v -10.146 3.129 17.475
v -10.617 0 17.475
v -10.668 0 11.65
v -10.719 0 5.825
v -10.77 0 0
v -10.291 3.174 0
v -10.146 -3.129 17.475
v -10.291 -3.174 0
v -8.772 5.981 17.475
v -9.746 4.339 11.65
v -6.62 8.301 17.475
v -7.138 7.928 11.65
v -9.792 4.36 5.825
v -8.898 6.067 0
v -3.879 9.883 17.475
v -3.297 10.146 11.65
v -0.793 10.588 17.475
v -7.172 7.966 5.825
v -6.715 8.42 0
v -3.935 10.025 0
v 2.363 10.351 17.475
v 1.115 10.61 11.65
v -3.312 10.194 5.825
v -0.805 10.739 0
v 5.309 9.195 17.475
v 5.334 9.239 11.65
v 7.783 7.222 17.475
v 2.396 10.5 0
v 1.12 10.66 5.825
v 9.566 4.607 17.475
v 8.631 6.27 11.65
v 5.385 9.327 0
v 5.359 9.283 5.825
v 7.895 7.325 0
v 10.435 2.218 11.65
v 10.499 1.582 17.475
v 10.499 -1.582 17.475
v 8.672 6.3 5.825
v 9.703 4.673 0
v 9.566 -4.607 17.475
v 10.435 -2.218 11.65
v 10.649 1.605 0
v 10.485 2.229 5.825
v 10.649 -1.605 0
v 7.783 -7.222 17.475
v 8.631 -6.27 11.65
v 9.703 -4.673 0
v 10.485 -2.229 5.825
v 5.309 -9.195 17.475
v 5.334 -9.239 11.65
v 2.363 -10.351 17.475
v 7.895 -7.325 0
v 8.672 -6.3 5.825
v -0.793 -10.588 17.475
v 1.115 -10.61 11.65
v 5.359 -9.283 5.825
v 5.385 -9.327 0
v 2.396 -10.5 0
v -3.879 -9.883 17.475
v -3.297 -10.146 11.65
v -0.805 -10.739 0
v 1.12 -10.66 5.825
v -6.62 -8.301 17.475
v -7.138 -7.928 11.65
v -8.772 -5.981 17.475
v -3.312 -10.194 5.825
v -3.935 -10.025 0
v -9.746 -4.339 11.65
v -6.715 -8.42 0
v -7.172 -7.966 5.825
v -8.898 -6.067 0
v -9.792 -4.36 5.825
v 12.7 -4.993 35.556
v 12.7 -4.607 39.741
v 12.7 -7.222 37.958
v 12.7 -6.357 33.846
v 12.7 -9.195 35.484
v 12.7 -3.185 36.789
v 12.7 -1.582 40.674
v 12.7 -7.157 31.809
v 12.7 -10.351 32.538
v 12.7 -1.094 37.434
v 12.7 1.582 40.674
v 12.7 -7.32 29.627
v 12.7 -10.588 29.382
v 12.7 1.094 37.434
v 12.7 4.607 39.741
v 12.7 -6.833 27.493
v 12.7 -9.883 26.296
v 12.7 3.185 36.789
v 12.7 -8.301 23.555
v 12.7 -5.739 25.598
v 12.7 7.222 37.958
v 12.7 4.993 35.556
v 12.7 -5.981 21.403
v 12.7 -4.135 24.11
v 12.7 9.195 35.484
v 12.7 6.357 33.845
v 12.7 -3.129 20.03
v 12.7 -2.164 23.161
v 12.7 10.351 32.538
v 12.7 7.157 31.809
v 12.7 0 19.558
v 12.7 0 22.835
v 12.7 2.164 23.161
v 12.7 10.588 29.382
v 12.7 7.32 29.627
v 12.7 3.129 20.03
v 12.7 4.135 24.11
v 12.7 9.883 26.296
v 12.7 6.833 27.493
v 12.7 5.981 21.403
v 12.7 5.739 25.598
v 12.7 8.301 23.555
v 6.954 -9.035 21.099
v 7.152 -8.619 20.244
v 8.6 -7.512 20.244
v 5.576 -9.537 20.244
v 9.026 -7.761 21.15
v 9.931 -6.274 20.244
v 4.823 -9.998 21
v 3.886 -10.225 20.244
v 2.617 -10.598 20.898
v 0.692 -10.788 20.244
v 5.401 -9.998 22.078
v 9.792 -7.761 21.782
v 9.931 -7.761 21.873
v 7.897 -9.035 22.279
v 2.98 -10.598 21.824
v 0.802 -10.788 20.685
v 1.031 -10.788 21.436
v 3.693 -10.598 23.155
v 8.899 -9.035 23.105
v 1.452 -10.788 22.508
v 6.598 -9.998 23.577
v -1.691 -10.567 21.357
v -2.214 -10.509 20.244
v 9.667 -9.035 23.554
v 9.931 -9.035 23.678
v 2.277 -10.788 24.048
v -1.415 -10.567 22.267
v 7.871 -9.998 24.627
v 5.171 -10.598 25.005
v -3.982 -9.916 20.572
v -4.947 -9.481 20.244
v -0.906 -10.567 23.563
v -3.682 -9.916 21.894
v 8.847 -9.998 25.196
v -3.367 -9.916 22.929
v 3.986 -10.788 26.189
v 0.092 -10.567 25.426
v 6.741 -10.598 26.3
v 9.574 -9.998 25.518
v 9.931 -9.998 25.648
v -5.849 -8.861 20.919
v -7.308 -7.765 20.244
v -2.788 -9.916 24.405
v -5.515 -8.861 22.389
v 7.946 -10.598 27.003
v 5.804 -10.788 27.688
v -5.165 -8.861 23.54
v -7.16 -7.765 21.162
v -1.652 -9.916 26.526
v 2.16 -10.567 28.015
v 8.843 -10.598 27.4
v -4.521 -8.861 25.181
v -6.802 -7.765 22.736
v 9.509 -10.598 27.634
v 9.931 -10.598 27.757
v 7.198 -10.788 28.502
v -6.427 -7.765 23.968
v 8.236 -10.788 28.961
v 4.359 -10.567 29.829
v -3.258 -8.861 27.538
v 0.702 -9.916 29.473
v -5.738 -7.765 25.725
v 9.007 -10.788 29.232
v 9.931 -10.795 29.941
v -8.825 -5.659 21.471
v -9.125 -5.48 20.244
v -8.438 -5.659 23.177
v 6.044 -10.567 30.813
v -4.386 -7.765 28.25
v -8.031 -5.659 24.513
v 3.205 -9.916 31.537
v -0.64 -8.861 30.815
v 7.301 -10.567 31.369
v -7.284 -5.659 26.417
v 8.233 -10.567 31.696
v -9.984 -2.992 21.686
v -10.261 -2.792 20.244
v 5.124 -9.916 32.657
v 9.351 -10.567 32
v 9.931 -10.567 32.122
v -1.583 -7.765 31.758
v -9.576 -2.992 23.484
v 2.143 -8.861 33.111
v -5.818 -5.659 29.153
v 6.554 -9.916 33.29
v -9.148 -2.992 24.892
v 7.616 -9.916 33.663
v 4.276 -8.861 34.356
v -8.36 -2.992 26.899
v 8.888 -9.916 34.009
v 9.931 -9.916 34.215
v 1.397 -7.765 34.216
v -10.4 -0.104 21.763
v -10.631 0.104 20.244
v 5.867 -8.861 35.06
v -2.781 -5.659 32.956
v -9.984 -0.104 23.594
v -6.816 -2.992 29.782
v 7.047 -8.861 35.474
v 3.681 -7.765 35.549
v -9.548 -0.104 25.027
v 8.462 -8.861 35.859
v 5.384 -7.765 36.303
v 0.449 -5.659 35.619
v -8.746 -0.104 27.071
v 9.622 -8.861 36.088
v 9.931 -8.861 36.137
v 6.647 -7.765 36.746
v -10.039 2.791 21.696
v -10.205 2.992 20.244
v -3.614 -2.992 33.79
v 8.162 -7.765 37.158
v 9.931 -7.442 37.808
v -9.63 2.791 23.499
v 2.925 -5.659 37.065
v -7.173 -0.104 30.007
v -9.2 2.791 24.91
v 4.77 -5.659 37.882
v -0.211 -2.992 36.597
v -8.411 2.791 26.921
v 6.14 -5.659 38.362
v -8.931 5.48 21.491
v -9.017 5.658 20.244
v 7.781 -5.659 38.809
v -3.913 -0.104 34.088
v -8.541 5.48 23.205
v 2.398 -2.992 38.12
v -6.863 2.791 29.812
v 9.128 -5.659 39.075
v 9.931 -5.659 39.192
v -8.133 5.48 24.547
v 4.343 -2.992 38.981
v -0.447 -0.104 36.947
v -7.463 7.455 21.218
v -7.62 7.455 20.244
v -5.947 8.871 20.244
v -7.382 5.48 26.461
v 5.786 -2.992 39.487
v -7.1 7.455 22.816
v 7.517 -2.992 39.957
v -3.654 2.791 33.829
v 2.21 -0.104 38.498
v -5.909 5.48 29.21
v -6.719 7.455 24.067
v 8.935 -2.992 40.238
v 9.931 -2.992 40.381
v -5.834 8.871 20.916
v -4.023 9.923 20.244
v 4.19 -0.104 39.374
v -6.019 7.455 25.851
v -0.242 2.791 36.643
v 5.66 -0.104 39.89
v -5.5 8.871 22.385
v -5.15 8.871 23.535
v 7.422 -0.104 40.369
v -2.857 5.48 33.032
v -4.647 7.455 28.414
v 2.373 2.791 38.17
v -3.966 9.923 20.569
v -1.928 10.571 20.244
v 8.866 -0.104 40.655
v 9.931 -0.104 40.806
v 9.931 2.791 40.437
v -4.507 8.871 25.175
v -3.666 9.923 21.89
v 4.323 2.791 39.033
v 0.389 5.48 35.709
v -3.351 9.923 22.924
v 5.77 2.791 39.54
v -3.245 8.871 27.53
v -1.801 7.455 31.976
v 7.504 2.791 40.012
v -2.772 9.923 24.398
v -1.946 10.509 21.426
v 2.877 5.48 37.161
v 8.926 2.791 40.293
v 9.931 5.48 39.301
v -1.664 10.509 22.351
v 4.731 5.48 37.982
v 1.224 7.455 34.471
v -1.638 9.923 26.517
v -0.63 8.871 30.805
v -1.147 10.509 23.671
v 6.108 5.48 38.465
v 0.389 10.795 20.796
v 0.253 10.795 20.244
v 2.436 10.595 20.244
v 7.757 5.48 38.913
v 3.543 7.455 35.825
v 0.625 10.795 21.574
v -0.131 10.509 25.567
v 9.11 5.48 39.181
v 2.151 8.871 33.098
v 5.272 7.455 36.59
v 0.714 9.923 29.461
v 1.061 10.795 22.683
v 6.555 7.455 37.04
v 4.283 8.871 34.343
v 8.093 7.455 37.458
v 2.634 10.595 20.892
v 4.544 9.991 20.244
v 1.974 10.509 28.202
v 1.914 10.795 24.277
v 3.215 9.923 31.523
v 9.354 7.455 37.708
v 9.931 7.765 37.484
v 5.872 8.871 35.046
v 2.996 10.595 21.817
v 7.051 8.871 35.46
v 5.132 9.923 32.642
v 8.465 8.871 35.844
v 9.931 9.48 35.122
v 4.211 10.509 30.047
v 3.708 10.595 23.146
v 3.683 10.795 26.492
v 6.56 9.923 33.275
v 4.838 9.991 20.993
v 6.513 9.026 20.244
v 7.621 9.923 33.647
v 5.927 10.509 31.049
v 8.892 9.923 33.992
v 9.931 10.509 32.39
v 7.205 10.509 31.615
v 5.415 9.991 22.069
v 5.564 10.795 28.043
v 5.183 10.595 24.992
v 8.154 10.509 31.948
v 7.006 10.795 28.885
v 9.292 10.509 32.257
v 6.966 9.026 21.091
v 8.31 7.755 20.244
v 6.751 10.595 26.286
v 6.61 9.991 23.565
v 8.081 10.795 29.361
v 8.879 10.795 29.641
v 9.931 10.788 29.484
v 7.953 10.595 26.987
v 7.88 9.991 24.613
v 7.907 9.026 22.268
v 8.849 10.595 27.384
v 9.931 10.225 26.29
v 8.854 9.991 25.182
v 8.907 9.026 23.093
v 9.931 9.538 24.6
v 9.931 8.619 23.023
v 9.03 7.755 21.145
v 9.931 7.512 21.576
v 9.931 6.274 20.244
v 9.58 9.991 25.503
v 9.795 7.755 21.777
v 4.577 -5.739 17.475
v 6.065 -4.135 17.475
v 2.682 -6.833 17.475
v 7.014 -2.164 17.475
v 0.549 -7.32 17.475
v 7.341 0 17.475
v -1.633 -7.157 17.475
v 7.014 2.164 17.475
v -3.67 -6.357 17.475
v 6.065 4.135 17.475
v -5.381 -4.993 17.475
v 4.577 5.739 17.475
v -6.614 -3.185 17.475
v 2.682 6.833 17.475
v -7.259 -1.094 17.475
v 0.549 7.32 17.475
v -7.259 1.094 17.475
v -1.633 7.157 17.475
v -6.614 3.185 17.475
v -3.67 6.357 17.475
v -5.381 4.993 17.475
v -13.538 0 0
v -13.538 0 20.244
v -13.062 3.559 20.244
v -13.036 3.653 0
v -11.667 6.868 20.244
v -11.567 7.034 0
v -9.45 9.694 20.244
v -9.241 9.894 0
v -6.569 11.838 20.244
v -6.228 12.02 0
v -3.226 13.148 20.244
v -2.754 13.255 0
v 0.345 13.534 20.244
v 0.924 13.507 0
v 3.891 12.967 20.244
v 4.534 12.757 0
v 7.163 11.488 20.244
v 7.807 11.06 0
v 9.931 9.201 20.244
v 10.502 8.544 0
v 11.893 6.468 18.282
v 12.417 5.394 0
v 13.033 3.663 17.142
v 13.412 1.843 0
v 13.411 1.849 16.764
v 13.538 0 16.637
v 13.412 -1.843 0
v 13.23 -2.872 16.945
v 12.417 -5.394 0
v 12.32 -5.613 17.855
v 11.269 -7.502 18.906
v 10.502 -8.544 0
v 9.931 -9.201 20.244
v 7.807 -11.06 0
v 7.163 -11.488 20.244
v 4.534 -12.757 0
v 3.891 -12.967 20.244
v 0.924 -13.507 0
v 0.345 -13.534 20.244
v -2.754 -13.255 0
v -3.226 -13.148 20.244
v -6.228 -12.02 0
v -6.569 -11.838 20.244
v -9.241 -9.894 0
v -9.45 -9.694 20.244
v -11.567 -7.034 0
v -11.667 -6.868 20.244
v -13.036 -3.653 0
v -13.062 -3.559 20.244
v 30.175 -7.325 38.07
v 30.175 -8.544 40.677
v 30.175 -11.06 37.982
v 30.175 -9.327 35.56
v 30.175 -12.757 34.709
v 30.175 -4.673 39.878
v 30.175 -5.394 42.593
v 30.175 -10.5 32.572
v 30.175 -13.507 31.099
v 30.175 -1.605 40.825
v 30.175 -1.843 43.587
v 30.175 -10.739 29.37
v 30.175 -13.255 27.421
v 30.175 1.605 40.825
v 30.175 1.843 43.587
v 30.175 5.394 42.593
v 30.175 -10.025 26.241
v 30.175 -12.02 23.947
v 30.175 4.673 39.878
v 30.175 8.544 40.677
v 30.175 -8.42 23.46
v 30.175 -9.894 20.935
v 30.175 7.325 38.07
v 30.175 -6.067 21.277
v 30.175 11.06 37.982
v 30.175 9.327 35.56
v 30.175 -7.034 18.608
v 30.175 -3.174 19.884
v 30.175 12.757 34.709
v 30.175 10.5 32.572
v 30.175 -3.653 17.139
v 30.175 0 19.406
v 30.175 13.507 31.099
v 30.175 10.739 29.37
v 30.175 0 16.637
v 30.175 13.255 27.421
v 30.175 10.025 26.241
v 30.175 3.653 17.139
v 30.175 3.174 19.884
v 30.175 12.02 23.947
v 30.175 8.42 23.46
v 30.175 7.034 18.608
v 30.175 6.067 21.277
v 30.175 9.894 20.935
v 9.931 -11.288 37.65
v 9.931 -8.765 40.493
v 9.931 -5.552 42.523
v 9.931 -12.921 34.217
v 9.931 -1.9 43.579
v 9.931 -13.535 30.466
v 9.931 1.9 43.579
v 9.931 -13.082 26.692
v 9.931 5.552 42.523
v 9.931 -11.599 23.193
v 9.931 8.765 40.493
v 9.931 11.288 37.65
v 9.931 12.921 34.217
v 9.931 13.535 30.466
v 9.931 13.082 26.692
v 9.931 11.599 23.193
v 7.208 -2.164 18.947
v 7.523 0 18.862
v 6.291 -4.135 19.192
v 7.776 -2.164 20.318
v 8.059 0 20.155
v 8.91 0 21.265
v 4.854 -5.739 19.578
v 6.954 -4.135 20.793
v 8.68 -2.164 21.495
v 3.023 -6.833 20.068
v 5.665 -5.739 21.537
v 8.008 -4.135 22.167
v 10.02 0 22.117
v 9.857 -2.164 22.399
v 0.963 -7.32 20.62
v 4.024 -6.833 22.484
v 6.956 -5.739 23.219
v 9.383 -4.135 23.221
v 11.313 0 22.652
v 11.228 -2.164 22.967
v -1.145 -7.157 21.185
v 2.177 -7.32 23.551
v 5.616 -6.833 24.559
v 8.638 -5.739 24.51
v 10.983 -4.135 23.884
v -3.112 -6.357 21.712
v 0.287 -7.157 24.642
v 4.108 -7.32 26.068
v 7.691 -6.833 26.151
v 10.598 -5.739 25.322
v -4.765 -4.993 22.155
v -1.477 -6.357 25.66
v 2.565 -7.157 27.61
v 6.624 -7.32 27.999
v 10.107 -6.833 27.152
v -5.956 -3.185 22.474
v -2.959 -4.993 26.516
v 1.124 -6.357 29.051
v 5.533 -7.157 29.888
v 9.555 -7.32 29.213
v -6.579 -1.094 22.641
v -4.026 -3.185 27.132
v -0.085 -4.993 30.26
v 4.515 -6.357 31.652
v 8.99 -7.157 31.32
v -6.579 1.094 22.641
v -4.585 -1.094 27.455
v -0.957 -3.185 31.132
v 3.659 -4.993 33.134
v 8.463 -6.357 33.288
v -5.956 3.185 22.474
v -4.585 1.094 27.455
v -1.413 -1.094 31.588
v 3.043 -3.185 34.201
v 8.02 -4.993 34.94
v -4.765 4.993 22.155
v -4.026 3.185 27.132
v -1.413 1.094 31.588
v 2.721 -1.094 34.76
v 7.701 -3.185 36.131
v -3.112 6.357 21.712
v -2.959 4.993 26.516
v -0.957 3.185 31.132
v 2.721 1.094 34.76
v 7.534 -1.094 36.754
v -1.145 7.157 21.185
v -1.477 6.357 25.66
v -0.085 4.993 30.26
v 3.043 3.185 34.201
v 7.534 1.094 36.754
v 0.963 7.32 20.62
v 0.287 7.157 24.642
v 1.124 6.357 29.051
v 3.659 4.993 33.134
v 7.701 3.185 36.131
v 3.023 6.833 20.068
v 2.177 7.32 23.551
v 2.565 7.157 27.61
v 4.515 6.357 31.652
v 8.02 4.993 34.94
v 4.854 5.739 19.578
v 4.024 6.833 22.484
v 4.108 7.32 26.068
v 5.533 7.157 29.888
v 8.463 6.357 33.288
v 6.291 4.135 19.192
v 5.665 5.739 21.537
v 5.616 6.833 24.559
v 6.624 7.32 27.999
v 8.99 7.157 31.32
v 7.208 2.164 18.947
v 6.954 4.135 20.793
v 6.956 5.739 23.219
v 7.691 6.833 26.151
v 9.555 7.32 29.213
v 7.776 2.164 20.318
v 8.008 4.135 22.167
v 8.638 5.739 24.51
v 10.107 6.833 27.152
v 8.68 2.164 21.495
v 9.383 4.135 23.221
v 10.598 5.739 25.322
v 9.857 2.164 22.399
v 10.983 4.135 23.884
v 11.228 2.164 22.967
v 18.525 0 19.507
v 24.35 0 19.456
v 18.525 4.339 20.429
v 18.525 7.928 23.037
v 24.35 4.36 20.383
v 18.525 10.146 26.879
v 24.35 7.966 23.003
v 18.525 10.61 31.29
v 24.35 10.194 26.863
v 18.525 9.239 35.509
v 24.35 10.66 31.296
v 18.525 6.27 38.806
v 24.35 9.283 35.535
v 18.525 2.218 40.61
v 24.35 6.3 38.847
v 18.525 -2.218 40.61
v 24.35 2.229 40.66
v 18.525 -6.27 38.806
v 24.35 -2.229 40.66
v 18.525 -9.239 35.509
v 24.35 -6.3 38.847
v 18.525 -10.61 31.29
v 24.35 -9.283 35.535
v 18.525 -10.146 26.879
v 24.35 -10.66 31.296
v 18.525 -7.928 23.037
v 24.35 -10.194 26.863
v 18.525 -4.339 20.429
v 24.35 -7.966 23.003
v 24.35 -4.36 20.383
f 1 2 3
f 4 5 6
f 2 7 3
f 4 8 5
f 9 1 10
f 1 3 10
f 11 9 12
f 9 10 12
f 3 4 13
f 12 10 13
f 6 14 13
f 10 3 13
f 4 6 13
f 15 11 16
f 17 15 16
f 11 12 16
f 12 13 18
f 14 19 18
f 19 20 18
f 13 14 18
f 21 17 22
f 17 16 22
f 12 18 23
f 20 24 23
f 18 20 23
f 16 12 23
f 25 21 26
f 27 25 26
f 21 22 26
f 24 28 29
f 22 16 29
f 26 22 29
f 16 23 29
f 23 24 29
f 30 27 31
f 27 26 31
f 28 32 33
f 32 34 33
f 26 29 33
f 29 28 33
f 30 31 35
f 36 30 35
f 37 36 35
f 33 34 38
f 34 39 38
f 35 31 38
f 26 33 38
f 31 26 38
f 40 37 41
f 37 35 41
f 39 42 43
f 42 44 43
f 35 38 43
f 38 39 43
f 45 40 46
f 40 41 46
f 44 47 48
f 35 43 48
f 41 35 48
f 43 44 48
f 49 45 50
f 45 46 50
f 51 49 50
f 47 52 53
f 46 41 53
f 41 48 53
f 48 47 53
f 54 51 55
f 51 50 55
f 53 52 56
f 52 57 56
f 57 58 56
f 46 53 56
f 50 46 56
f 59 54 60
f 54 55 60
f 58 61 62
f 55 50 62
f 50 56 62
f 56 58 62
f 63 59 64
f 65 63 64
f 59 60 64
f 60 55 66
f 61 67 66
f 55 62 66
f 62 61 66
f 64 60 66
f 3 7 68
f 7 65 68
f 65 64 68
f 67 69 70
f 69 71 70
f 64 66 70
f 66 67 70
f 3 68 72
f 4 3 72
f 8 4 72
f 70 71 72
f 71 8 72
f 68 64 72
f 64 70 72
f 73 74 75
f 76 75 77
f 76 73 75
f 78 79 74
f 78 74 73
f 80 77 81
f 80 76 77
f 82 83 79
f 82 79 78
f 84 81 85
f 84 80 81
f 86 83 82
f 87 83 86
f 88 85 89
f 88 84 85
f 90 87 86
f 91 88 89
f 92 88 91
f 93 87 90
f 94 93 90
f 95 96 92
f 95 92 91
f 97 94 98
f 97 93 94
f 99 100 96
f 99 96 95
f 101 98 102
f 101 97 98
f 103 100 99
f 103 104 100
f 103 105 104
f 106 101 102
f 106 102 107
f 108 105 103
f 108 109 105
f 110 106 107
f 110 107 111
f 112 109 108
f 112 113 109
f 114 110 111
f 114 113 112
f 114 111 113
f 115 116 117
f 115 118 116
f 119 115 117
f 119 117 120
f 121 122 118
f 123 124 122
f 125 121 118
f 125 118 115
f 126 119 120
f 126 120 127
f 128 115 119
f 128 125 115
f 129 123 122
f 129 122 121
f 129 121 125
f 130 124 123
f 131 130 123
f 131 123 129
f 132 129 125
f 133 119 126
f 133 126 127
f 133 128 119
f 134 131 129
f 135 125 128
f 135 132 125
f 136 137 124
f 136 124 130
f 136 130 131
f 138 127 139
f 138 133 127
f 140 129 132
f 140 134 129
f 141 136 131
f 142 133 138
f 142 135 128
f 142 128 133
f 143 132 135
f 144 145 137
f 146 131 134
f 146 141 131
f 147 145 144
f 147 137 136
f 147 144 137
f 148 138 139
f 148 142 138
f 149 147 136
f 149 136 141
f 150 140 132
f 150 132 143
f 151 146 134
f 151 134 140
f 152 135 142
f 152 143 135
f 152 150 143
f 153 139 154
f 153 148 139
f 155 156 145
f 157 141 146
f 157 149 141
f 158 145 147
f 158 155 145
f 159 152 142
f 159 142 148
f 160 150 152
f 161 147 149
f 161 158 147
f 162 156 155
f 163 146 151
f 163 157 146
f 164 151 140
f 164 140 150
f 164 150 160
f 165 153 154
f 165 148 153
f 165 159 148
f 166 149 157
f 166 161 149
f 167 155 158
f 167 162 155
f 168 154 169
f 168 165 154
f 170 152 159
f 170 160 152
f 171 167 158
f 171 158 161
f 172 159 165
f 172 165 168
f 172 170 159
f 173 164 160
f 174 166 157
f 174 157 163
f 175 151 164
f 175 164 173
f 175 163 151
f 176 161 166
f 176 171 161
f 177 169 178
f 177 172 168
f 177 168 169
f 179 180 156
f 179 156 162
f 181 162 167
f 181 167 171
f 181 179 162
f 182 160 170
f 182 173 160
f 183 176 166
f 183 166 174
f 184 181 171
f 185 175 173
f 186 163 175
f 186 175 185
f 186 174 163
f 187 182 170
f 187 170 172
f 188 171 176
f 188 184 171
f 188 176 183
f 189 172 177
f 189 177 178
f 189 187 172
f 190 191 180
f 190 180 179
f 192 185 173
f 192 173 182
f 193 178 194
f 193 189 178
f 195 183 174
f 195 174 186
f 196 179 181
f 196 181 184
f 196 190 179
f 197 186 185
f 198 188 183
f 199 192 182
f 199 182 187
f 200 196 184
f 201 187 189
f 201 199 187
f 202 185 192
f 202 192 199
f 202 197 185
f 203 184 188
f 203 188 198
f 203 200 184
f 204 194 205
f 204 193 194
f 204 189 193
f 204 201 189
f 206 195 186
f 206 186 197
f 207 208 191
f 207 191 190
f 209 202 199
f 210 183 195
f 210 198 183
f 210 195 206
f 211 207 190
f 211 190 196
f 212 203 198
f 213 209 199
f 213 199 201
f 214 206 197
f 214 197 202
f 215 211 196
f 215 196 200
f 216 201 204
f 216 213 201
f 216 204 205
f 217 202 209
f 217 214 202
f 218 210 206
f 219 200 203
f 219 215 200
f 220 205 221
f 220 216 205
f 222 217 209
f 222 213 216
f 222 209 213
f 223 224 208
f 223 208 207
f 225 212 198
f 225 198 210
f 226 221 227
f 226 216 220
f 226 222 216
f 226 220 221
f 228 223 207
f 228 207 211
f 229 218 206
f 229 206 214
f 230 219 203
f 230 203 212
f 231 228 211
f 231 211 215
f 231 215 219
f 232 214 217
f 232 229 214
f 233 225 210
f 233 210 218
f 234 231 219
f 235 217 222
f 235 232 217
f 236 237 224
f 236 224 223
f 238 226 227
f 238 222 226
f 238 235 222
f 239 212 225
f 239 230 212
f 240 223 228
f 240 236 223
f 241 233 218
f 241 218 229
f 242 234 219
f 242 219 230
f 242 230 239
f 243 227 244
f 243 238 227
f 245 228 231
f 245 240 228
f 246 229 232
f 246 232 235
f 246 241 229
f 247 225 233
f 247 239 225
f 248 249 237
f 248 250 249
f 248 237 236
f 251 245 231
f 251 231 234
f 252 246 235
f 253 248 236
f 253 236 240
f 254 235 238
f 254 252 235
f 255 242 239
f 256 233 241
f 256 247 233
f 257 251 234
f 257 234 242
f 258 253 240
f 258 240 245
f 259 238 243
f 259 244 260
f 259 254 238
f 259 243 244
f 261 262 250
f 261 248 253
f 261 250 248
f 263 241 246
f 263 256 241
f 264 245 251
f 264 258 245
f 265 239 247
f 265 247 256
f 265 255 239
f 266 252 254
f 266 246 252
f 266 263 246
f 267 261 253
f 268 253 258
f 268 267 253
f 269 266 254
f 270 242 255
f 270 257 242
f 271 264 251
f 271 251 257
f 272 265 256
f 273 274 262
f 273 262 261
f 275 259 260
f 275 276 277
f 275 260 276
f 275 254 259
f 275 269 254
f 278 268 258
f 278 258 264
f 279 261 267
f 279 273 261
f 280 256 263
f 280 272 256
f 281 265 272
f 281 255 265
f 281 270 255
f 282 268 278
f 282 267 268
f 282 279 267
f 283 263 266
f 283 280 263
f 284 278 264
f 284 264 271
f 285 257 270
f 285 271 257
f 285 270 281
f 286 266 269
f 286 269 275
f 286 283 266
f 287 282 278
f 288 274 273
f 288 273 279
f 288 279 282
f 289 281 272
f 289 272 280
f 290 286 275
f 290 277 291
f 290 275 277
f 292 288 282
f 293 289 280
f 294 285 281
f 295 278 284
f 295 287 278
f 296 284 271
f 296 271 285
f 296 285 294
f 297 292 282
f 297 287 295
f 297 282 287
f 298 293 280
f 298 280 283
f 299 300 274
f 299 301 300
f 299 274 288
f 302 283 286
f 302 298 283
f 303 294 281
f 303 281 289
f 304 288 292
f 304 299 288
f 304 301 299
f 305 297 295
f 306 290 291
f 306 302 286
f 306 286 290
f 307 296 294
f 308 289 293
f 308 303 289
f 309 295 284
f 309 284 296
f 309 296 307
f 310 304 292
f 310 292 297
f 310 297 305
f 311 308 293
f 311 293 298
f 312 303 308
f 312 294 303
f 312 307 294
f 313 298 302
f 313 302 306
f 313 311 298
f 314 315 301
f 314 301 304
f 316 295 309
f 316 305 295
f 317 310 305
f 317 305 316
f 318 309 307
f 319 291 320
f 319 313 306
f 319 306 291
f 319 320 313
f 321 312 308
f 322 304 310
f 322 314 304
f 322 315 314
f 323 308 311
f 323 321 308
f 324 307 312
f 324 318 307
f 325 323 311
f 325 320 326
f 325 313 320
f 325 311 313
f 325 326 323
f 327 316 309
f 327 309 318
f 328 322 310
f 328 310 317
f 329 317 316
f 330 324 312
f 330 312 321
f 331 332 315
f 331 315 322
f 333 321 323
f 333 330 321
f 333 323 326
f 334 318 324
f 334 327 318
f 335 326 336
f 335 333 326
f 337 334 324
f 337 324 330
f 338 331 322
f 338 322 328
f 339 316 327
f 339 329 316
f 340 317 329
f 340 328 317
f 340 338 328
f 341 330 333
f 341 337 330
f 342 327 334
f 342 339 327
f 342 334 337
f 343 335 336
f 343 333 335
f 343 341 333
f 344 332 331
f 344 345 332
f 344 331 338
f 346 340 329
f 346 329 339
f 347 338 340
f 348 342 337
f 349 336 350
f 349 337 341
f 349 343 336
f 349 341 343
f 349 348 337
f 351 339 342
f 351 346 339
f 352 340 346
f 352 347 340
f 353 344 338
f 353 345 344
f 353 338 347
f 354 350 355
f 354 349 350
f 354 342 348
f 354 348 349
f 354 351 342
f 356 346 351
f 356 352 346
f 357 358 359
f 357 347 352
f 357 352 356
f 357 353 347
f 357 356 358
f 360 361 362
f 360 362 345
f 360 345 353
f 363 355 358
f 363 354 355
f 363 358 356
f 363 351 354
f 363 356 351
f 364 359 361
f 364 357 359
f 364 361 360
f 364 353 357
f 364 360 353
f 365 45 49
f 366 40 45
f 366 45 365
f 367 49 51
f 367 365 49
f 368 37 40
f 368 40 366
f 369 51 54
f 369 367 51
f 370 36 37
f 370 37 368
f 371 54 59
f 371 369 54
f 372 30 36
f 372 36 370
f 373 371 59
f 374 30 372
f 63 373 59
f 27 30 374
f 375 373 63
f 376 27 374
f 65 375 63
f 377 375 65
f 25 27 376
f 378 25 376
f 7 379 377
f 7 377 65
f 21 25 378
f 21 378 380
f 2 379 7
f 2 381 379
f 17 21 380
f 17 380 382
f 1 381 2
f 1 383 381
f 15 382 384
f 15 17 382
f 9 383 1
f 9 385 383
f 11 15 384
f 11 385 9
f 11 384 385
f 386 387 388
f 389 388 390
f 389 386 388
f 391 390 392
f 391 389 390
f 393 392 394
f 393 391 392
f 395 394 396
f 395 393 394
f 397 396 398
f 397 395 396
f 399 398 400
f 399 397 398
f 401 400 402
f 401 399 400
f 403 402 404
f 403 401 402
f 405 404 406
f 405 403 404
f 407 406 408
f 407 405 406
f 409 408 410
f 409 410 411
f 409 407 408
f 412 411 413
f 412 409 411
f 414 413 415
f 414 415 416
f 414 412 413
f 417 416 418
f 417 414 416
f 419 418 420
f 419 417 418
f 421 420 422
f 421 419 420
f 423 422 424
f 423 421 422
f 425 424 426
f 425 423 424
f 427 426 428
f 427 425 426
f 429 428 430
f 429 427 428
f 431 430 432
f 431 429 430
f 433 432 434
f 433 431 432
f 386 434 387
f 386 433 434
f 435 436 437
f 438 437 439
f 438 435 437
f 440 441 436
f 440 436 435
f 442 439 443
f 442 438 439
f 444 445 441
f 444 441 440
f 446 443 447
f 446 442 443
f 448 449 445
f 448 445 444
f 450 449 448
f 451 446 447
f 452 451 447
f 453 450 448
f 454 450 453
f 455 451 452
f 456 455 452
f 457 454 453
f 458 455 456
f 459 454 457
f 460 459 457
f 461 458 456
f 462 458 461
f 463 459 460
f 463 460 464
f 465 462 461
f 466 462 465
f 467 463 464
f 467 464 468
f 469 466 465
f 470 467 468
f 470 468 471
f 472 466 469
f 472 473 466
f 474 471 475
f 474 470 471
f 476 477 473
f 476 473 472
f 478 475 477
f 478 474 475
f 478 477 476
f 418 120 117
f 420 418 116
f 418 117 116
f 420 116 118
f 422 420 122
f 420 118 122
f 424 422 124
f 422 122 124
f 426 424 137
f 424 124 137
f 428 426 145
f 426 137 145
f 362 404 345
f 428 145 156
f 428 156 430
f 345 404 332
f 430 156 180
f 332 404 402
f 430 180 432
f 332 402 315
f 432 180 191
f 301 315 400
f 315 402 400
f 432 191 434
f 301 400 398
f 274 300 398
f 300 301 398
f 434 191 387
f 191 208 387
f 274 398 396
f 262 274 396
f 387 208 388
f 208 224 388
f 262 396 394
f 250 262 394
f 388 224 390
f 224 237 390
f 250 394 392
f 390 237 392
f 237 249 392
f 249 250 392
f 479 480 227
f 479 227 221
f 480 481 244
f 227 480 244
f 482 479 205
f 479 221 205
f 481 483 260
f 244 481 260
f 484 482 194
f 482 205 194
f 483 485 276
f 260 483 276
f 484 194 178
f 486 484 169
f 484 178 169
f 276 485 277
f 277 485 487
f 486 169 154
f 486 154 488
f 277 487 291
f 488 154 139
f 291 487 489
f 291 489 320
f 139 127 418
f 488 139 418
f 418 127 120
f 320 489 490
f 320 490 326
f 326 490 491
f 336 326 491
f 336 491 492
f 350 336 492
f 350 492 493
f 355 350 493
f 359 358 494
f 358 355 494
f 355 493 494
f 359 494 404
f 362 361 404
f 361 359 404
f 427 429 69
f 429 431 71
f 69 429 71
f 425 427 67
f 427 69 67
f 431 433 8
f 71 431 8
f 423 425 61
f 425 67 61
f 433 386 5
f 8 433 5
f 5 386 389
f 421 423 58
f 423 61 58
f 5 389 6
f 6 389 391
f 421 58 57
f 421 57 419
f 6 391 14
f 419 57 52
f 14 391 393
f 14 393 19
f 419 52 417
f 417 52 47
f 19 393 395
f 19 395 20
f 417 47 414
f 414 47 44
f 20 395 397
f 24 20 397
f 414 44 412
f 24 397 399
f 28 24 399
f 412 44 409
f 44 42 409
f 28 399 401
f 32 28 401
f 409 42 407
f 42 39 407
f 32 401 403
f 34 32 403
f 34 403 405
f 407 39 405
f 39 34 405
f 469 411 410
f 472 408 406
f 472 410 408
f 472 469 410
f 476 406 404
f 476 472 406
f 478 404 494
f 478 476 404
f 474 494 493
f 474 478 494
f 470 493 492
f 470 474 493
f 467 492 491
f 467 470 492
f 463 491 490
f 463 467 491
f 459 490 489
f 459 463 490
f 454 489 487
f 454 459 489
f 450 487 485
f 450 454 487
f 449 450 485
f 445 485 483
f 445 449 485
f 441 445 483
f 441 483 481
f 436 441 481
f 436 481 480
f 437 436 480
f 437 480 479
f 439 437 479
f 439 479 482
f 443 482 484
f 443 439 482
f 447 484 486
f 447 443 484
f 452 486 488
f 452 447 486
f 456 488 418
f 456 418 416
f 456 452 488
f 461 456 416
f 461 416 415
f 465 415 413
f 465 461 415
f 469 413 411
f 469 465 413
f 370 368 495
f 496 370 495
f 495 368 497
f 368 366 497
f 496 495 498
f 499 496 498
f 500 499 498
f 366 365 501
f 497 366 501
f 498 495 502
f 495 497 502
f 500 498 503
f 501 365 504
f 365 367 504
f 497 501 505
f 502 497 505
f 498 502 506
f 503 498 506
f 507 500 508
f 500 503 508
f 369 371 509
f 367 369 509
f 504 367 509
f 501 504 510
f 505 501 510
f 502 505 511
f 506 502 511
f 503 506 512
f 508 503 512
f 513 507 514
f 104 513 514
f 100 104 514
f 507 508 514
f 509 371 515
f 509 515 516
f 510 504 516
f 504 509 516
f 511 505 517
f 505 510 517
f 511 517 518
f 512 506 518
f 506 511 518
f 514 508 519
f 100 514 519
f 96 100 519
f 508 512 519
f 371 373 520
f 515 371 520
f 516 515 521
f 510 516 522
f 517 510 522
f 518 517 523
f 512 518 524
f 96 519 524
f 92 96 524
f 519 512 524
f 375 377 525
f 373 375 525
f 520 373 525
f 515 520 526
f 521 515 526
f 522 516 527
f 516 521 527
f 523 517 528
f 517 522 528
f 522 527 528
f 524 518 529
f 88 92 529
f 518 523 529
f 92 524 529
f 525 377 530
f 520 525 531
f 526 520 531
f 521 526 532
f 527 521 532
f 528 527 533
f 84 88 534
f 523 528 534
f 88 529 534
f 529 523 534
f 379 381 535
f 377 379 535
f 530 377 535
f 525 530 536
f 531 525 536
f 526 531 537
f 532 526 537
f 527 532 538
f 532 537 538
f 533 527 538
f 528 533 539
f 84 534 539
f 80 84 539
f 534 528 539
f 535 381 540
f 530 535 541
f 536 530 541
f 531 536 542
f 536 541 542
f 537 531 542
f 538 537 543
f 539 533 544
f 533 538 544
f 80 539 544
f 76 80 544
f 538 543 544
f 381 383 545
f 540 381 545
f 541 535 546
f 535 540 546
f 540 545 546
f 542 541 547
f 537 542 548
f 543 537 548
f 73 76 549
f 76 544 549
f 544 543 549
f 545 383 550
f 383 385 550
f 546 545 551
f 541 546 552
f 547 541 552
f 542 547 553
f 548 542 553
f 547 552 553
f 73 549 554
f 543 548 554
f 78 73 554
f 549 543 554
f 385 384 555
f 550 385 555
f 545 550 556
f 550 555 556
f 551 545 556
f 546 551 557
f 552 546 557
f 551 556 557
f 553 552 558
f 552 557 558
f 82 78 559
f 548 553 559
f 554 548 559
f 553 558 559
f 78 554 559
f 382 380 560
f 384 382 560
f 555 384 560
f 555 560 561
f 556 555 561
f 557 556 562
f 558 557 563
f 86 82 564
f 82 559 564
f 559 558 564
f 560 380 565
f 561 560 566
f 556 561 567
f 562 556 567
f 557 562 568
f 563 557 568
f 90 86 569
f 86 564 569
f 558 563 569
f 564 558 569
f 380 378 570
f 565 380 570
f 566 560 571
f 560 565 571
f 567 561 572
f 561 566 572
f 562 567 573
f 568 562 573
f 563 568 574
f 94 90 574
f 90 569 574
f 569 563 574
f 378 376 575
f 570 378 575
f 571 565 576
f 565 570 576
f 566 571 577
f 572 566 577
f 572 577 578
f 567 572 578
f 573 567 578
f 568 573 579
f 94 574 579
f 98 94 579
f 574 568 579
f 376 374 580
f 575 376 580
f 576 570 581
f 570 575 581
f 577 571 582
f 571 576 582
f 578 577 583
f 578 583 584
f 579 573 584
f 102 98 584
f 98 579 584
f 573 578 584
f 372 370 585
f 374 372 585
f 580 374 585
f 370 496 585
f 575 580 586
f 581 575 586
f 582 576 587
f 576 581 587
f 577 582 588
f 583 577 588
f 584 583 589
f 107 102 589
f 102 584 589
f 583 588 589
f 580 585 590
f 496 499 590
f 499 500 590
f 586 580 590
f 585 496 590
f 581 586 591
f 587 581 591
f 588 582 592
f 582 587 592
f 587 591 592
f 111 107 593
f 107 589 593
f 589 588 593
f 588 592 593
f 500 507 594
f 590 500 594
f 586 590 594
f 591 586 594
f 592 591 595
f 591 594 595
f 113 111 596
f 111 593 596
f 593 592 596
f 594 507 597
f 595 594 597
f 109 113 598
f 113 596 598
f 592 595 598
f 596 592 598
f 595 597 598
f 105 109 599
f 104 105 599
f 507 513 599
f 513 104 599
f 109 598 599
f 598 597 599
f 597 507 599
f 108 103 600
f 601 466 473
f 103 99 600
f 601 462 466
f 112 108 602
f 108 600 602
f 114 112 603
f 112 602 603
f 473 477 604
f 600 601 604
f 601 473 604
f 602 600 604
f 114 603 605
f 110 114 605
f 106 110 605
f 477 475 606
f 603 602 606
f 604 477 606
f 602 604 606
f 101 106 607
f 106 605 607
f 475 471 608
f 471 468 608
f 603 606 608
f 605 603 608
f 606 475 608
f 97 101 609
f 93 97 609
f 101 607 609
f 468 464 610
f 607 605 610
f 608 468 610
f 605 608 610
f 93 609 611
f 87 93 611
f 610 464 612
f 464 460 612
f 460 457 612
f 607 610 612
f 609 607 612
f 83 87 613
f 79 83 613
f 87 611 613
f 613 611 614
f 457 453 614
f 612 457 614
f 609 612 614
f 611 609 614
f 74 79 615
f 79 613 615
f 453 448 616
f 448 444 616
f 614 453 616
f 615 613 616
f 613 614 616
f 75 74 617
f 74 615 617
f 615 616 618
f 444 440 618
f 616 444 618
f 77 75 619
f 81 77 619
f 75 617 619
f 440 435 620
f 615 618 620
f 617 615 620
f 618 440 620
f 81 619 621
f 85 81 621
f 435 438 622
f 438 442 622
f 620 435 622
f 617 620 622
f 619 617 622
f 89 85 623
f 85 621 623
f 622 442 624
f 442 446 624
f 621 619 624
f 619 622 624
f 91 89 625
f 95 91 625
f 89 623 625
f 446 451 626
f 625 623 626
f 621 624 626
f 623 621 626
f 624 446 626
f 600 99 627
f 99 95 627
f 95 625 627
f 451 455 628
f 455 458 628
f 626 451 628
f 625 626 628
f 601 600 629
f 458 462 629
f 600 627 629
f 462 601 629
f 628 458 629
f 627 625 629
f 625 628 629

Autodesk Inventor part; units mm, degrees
ref_plane "YZ Plane" through (0, 0, 0) normal (1, 0, 0) x (0, 1, 0)
ref_plane "XZ Plane" through (0, 0, 0) normal (0, 1, 0) x (-1, 0, 0)
ref_plane "XY Plane" through (0, 0, 0) normal (0, 0, 1) x (1, 0, 0)
sketch "Sketch1" plane through (0, 0, 0) normal (0, 1, 0) x (-1, 0, 0)
  line L0 (0, 0) -> (0, 17.4752)
  arc A0 (0, 17.4752) -> (-12.7, 30.1752) centre (-12.7, 17.4752) ccw
  line L1 (-12.7, 30.1752) -> (-30.1752, 30.1752)
  line L2 (-12.7, 30.1752) -> (0, 30.1752) construction
  line L3 (0, 30.1752) -> (0, 17.4752) construction
  dimension "d0" = 30.1752
  dimension "d1" = 30.1752
  dimension "d2" = 17.4752
sketch "Sketch2" plane through (0, 0, 0) normal (0, 0, 1) x (1, 0, 0)
  circle A0 centre (0, 0) radius 10.795
  circle A1 centre (0, 0) radius 7.3406
  dimension "d3" = 14.6812
  dimension "d4" = 21.59
sweep "Sweep1" add profiles "Sketch2" path "Sketch1"
sketch "Sketch3" plane through (0, 0, 0) normal (0, 0, -1) x (-1, 0, 0)
  circle A0 centre (0, 0) radius 13.5382
  circle A1 centre (0, 0) radius 10.795 projected
  circle A2 centre (0, 0) radius 9.0678
  dimension "d6" = 27.0764
  dimension "d9" = 18.1356
extrude "Extrusion1" add sketch "Sketch3" against normal blind 20.2438 contours A0 | A1
sketch "Sketch4" plane through (30.1752, 0, 30.1752) normal (1, 0, 0) x (0, 0, -1)
  circle A0 centre (0, 0) radius 7.3406 projected
  circle A1 centre (0, 0) radius 9.0678
  circle A2 centre (0, 0) radius 13.5382
  dimension "d10" = 27.0764
  dimension "d11" = 18.1356
extrude "Extrusion2" add sketch "Sketch4" against normal blind 20.2438 contours A2
sketch "Sketch5" plane through (0, 0, 0) normal (0, 0, -1) x (-1, 0, 0)
  circle A0 centre (0, 0) radius 7.3406 projected
  circle A1 centre (0, 0) radius 10.7696
  dimension "d14" = 21.5392
sketch "Sketch5 outline for Extrusion3" plane through (0, 0, 0) normal (0, 0, -1) x (-1, 0, 0)
  circle A0 centre (0, 0) radius 10.7696
extrude "Extrusion3" cut sketch "Sketch5 outline for Extrusion3" against normal blind 17.4752 draft -0.49966
sketch "Sketch6" plane through (30.1752, 0, 30.1752) normal (1, 0, 0) x (0, 0, -1)
  circle A0 centre (0, 0) radius 7.3406 projected
  circle A1 centre (0, 0) radius 10.7696
  dimension "d17" = 21.5392
sketch "Sketch6 outline for Extrusion4" plane through (30.1752, 0, 30.1752) normal (1, 0, 0) x (0, 0, -1)
  circle A0 centre (0, 0) radius 10.7696
extrude "Extrusion4" cut sketch "Sketch6 outline for Extrusion4" against normal blind 17.4752 draft -0.49966
equation "\"d0\" = G + C1"
equation "\"d1\" = G + C1"
equation "\"d2\" = C1"
equation "\"d3\" = D"
equation "\"d4\" = D + 2 * F1"
equation "\"d6\" = A + 2 * E1"
equation "\"d9\" = D + F1"
equation "\"d7\" = C1 + E1"
equation "\"d10\" = A + 2 * E1"
equation "\"d11\" = D + F1"
equation "\"d12\" = C1 + E1"
equation "\"d14\" = A"
equation "\"d15\" = C1"
equation "\"d17\" = A"
equation "\"d18\" = C1"
equation "\"A\" = 21.5392"
equation "\"C1\" = 17.4752"
equation "\"F1\" = 3.4544"
equation "\"D\" = 14.6812"
equation "\"G\" = 12.7"
equation "\"E1\" = 2.7686"
equation "\"B\" = 21.2344"
equation "\"Size_Designation\" = 0.5"
properties part number "ASTM D 2466 90 Deg Elbow Socket-Type - Schedule 40 1/2" material "PVC-Piping"
